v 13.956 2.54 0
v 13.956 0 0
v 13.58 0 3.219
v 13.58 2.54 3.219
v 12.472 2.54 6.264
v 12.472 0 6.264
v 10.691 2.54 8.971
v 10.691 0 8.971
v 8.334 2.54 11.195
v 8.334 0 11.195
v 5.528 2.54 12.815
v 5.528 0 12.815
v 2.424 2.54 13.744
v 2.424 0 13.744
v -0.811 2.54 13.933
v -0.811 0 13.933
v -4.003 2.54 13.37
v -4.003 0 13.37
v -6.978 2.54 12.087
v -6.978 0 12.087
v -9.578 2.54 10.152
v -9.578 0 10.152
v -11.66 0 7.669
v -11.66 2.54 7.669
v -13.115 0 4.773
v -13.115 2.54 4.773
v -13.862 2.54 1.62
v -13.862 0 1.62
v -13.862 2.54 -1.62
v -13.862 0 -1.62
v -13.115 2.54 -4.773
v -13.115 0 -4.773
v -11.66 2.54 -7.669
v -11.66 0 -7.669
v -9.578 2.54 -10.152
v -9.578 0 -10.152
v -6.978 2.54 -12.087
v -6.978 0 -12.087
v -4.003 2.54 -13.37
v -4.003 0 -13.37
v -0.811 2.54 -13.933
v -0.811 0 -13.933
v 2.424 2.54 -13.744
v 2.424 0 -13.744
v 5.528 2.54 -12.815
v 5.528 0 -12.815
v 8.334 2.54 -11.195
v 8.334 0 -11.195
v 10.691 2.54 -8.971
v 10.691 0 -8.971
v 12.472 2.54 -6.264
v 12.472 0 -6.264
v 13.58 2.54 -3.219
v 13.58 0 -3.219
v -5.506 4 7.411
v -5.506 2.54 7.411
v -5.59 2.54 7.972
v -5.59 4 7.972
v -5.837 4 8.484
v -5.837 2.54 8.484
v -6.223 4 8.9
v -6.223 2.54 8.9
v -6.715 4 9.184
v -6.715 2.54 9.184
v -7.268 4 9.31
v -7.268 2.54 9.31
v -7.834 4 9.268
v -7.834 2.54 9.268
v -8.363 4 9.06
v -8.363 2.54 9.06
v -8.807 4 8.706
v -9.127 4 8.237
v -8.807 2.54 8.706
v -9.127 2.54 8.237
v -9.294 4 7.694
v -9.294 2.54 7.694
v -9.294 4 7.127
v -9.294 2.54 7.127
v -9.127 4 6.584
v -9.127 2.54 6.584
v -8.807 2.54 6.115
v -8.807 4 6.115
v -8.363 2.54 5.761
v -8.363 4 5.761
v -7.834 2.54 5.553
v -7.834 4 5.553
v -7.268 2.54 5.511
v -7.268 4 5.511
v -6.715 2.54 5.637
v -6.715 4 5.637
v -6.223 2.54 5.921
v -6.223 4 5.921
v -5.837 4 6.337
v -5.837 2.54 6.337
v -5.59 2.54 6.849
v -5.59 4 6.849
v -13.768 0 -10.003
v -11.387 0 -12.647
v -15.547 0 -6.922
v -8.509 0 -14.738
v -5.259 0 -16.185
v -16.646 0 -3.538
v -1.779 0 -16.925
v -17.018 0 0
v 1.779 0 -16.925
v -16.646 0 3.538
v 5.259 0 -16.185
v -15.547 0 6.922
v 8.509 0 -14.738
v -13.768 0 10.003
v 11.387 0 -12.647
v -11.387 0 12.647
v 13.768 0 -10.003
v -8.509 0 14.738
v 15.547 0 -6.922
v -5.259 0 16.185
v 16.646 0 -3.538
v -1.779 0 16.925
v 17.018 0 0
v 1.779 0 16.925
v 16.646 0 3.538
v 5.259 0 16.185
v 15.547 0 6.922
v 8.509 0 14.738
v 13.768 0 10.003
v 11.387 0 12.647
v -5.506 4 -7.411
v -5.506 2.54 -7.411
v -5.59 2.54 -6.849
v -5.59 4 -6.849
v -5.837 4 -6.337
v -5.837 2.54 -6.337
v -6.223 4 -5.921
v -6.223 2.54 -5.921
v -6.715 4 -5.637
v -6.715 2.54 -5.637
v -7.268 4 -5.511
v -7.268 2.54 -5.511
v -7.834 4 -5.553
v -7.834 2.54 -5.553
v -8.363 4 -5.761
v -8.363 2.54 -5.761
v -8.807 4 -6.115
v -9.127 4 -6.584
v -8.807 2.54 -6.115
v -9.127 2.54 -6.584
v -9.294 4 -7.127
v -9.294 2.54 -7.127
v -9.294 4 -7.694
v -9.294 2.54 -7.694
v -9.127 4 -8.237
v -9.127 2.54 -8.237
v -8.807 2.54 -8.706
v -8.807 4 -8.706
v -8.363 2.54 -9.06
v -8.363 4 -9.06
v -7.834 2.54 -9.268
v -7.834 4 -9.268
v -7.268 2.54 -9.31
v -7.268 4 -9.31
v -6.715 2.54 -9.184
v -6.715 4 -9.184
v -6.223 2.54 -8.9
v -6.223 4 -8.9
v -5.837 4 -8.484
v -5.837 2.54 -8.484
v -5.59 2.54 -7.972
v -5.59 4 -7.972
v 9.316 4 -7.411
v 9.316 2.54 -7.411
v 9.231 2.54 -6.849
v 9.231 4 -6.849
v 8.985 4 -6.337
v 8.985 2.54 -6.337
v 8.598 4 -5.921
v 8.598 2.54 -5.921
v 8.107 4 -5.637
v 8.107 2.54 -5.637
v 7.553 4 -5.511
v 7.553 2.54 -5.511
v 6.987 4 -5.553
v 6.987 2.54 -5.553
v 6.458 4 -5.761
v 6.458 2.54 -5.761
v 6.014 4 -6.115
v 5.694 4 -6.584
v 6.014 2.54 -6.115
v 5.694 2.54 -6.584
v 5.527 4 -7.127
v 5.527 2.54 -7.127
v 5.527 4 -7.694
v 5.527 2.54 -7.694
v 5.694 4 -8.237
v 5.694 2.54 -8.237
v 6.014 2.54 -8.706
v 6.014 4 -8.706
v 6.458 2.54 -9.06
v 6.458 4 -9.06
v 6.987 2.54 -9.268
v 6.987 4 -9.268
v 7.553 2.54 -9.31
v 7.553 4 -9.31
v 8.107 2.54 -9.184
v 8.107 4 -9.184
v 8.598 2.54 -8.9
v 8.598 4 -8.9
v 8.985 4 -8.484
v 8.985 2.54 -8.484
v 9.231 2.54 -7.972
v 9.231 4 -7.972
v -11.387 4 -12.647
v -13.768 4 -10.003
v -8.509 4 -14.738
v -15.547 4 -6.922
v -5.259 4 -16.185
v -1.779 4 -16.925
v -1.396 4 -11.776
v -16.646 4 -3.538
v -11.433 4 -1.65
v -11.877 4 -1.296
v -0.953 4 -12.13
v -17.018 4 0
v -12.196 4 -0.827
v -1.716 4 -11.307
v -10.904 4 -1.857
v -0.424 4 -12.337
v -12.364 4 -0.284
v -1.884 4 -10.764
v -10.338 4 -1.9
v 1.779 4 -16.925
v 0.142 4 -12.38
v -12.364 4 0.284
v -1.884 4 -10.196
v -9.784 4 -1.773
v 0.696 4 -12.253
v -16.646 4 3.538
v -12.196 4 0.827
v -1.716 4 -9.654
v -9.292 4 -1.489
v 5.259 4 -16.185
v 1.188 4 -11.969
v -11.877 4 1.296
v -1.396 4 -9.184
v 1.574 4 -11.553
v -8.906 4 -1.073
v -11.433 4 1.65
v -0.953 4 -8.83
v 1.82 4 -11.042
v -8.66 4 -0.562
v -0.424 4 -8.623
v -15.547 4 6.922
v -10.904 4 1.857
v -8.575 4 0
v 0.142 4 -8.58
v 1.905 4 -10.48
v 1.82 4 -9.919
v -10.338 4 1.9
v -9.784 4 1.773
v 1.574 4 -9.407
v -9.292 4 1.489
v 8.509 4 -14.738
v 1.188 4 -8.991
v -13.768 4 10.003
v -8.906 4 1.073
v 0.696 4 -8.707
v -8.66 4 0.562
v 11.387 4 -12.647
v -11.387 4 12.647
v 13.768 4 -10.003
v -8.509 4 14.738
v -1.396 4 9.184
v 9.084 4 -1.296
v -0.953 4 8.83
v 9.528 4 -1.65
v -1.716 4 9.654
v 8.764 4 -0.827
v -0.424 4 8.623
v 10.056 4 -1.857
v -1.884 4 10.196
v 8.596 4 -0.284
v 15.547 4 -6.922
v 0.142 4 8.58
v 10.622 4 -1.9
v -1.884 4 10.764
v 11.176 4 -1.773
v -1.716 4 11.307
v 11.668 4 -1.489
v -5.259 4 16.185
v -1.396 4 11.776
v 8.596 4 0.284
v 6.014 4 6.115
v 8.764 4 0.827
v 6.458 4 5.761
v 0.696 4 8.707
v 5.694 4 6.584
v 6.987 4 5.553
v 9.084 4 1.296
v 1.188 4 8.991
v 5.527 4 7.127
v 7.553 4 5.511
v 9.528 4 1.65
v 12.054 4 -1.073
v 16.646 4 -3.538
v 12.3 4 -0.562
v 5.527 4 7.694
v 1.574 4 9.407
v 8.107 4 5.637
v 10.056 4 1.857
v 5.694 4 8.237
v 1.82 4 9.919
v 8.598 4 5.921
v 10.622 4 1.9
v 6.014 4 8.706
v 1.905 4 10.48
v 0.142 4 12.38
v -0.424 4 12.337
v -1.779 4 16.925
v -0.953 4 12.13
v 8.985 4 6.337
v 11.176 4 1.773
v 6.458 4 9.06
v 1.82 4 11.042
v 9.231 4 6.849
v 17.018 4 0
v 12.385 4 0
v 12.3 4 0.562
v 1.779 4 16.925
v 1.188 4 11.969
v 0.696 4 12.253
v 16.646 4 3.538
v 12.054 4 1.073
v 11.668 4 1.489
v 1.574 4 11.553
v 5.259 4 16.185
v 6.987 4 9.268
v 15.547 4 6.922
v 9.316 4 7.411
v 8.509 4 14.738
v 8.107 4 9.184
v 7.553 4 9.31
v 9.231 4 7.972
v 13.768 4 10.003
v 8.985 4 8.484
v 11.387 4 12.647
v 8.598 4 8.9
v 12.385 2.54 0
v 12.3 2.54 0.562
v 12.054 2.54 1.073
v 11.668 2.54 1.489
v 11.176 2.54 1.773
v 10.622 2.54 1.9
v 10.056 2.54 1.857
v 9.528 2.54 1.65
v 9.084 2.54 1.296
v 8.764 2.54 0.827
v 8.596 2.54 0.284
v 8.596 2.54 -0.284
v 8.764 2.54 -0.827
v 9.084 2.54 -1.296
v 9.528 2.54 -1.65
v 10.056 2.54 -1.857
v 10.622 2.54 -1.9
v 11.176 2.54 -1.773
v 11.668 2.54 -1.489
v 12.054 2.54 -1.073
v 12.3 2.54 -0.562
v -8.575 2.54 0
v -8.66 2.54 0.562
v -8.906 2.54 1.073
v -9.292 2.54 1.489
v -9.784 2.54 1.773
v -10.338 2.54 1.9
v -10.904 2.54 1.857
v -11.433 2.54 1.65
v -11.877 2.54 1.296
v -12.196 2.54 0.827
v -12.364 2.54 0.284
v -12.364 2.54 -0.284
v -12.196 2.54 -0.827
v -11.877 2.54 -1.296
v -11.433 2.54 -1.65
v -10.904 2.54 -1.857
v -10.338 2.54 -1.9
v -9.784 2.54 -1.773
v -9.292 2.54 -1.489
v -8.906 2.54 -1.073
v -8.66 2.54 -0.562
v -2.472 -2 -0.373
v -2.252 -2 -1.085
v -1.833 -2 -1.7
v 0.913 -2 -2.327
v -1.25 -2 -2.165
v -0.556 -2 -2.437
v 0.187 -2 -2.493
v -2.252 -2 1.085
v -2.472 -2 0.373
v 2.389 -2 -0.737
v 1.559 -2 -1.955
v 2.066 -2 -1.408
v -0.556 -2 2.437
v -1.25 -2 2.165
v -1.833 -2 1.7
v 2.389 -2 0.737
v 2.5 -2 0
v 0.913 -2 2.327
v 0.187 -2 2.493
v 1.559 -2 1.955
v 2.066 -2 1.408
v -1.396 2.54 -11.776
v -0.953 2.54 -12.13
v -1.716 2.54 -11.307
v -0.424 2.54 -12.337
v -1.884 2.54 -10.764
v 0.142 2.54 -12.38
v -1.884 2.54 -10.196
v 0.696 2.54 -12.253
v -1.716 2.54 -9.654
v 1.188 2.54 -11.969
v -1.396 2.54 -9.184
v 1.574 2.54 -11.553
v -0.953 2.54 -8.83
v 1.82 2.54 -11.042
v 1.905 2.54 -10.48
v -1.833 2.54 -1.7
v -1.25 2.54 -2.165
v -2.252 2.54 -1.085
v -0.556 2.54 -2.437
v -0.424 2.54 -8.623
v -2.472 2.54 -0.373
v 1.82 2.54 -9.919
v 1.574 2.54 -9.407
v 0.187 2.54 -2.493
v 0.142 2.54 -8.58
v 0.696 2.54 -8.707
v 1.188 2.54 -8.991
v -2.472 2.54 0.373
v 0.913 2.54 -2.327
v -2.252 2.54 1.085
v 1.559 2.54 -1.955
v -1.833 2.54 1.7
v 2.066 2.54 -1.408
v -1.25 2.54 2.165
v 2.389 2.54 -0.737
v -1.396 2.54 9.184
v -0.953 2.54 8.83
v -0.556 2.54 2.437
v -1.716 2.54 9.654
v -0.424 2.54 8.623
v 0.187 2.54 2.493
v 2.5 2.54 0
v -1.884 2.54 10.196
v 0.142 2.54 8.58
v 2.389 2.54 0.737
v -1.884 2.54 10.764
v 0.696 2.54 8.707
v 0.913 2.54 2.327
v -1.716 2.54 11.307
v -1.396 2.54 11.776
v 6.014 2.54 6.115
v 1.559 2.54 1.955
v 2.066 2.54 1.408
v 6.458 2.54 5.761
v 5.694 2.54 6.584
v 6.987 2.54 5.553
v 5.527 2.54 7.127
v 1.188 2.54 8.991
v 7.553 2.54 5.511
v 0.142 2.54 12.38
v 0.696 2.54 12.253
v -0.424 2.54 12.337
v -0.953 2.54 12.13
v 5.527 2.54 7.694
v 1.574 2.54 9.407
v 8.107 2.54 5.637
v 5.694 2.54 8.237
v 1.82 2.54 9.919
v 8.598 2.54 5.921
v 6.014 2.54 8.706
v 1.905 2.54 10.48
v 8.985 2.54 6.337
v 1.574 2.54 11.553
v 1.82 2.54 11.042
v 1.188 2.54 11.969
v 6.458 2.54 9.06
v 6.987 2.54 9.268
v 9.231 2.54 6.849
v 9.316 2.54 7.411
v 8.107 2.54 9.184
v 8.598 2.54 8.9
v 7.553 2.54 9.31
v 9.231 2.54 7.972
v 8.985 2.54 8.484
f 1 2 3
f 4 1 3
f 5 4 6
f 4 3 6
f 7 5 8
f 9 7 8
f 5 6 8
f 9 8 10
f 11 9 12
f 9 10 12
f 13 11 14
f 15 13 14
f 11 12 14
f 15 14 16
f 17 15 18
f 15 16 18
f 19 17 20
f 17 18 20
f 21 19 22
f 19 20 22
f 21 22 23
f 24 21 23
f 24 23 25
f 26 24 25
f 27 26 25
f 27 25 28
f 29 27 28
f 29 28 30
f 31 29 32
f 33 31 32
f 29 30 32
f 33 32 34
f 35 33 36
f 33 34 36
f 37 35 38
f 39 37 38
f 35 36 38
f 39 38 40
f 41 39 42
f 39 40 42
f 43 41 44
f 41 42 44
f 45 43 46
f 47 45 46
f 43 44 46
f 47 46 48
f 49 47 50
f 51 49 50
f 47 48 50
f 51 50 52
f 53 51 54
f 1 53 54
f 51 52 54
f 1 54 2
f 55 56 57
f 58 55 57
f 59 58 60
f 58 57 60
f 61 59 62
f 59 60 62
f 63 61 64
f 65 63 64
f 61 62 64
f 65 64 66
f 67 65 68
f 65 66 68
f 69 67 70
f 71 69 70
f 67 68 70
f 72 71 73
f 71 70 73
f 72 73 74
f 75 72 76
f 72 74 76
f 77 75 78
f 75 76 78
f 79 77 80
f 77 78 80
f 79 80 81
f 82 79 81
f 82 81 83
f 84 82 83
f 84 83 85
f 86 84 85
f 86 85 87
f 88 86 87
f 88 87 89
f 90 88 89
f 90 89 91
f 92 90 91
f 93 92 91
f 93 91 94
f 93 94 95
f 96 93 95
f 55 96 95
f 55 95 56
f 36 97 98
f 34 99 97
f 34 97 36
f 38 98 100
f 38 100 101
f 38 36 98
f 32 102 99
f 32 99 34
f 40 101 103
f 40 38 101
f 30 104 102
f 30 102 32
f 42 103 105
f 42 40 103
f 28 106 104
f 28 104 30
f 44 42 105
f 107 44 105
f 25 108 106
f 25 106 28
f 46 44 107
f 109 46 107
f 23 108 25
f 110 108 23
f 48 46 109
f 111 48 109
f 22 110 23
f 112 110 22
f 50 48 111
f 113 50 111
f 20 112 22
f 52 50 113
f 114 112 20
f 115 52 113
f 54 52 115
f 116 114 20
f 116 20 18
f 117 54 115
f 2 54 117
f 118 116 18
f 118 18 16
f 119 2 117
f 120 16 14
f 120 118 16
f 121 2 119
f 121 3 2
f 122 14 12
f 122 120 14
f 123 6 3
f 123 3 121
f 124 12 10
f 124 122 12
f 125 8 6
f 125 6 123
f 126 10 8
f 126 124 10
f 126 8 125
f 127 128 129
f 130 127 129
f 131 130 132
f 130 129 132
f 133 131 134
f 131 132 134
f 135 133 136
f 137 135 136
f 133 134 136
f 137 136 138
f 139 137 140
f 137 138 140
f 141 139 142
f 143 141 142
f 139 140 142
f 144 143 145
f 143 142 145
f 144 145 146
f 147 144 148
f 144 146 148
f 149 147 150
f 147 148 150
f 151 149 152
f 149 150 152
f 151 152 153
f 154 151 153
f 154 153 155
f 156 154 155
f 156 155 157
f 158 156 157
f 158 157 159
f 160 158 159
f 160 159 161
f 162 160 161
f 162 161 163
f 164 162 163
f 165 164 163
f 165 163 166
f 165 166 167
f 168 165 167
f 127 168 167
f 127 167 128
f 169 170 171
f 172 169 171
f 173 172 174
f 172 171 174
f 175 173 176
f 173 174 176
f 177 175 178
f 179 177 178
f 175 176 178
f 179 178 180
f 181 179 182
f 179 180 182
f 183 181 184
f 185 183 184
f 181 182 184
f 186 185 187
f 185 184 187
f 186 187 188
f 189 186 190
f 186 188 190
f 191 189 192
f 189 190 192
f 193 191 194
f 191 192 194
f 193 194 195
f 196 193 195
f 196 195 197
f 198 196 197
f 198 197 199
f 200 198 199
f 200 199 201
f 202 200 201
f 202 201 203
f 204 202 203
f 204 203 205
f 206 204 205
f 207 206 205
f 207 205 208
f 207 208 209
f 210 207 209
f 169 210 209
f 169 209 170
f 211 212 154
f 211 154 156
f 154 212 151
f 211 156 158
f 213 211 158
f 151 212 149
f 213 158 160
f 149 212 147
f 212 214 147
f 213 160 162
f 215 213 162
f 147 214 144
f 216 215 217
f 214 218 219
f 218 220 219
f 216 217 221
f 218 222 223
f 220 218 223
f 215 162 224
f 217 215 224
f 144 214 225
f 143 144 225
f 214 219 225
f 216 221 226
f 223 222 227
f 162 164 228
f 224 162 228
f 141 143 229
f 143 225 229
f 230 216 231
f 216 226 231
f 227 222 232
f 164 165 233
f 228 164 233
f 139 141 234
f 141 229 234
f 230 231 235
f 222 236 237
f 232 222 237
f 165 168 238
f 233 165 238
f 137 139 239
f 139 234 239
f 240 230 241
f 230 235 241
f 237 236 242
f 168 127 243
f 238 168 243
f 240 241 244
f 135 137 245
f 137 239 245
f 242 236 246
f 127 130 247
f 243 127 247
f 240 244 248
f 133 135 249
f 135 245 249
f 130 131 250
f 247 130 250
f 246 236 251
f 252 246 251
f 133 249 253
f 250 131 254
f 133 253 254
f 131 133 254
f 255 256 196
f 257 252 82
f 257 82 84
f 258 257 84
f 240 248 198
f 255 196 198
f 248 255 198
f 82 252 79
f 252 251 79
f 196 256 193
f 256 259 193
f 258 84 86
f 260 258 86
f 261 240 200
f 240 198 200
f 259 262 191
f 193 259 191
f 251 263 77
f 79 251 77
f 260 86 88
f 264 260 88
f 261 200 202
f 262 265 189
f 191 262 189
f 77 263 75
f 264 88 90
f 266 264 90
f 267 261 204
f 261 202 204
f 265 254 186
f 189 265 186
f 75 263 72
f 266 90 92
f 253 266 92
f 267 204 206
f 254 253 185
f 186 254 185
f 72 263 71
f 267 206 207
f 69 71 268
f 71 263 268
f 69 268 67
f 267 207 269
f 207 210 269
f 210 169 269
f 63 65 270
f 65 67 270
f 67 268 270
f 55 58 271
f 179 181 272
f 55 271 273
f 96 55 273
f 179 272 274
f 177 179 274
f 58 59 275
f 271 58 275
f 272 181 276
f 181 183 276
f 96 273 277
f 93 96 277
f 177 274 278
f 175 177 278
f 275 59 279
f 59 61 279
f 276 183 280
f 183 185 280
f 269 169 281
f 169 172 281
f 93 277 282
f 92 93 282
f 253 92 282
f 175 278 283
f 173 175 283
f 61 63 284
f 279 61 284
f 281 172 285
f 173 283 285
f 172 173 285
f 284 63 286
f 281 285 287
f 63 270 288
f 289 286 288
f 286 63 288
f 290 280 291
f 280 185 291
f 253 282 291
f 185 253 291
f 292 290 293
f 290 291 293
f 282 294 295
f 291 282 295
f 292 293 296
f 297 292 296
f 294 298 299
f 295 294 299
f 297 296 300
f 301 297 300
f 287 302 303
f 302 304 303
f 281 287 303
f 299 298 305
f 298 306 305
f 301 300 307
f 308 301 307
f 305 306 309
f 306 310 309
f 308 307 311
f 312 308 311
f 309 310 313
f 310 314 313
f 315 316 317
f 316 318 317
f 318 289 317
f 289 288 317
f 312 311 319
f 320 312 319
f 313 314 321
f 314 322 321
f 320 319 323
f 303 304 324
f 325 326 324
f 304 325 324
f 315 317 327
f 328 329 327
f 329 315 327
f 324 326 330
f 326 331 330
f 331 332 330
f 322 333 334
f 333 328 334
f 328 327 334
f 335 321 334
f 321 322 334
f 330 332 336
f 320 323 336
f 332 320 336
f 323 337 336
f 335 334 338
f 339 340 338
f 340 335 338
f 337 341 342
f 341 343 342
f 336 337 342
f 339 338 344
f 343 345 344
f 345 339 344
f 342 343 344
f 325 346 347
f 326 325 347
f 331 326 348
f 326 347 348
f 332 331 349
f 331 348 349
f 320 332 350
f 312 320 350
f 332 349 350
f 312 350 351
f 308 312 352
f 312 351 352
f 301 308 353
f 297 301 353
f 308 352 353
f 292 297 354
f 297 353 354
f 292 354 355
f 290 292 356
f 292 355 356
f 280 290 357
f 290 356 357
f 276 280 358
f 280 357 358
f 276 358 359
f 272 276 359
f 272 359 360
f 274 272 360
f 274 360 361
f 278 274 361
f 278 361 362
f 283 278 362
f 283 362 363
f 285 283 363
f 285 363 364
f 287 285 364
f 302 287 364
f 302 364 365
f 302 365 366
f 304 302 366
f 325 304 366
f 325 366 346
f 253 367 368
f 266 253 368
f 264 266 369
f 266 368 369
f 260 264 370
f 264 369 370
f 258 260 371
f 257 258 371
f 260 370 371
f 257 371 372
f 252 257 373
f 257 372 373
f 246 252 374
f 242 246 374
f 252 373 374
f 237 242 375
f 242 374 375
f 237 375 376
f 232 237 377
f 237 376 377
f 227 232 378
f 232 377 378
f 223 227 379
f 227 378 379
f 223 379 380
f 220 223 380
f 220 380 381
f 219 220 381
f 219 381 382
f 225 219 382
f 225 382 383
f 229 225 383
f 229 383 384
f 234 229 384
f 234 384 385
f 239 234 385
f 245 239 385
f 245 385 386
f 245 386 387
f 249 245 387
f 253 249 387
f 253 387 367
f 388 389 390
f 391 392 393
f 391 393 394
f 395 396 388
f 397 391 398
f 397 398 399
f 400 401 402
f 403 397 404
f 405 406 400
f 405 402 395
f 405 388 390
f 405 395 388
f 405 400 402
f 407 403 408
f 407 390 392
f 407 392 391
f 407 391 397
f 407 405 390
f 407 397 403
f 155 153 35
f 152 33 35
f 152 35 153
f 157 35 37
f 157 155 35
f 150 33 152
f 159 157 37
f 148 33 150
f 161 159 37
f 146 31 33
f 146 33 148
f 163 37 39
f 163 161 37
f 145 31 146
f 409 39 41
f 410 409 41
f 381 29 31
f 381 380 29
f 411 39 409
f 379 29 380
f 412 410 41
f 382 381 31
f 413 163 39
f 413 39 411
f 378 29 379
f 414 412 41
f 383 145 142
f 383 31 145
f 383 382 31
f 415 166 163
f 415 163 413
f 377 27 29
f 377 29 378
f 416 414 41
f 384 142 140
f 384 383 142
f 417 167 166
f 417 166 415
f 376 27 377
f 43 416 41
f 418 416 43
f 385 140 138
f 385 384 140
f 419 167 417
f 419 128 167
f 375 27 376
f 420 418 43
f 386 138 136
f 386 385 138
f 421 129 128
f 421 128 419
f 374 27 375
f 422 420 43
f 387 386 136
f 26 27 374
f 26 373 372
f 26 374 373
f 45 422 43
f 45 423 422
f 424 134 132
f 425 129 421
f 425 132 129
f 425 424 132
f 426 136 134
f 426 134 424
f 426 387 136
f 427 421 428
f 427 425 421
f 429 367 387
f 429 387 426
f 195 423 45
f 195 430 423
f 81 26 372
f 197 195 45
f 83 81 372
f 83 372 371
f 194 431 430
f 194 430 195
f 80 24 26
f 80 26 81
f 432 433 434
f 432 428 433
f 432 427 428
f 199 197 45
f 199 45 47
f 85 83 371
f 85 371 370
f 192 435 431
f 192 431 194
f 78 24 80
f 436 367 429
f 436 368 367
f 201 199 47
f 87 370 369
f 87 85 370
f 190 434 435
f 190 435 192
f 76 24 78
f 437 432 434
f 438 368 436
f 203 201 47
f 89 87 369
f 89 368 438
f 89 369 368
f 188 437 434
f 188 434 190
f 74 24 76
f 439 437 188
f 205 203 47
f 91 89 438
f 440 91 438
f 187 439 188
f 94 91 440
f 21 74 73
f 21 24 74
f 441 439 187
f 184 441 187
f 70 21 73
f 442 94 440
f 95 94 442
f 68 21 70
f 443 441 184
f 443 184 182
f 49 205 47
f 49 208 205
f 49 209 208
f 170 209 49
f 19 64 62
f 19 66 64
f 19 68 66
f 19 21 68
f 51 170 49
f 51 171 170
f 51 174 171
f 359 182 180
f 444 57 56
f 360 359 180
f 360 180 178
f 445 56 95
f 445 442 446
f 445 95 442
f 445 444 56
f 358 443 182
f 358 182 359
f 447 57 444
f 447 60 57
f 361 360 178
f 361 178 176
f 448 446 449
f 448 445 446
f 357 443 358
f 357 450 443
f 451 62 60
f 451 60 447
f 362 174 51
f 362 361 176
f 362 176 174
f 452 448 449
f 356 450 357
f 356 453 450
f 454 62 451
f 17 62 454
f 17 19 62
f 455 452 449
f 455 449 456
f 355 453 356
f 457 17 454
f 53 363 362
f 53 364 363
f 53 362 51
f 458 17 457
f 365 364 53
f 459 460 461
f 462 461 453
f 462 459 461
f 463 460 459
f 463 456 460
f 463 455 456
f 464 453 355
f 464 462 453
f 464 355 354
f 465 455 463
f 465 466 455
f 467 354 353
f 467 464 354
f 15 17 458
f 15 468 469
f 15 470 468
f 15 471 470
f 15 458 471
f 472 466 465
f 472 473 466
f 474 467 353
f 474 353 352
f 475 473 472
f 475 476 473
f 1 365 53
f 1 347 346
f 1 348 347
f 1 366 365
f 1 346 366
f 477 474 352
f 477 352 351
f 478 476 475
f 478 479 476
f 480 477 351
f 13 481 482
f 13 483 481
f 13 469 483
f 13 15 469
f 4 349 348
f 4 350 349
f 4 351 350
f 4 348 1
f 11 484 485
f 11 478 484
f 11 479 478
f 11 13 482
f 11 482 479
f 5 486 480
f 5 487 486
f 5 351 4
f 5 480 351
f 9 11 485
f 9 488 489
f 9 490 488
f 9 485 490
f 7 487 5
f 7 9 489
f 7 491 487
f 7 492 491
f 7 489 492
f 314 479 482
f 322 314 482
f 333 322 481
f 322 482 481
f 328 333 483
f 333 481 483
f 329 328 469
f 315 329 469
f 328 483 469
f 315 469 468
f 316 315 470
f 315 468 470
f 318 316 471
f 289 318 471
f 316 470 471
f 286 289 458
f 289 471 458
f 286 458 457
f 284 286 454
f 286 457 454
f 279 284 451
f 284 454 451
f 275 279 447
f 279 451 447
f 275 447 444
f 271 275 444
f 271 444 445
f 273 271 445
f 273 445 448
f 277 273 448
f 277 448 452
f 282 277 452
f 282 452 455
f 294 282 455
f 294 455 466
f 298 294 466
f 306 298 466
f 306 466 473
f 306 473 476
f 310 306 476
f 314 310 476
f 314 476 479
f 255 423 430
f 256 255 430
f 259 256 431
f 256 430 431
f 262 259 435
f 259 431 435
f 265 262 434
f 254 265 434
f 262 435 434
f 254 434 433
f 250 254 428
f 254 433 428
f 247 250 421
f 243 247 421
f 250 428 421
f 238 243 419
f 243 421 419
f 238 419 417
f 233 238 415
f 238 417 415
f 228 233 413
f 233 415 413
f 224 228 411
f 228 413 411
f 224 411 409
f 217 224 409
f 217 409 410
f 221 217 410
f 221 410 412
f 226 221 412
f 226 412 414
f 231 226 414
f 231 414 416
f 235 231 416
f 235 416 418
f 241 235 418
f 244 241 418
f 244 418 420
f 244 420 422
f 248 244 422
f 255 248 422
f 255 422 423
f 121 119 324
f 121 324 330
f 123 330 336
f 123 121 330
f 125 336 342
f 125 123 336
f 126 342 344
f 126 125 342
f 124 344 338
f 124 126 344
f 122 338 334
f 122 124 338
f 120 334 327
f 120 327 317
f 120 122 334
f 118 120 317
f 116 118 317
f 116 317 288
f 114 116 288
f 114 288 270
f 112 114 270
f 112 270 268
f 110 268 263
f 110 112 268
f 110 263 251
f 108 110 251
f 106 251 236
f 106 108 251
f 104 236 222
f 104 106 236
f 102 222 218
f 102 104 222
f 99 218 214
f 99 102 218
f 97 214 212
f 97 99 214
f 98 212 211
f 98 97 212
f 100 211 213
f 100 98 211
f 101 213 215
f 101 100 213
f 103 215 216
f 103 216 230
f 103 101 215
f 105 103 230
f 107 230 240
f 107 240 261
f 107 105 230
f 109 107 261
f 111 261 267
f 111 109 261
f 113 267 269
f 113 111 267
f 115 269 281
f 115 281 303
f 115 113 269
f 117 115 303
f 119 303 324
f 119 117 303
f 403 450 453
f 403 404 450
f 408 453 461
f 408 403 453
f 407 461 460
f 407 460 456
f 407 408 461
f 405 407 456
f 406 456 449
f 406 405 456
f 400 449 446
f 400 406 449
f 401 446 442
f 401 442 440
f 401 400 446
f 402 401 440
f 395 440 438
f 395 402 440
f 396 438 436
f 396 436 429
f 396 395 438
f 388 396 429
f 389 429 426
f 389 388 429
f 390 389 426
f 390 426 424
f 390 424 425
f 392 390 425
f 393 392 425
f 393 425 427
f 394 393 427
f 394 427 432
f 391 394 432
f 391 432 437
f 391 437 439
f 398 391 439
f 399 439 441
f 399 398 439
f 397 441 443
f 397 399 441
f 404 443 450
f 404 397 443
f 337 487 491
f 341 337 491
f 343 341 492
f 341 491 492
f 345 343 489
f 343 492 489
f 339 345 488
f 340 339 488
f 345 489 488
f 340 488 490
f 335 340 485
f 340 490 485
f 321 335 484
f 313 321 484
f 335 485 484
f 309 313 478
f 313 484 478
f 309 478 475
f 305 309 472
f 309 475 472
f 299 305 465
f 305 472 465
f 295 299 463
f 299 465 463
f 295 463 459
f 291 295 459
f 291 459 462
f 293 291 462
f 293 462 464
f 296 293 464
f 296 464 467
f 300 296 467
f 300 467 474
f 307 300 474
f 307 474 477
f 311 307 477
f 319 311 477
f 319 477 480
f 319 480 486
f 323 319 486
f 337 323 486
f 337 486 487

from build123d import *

# Parameters (mm, degrees)
F0_R      = 17.018
F1_DEPTH  = 4
F4_R      = 2.5
F5_DEPTH  = 2
F7_R      = 1.905
F8_DEPTH  = 25.4
F9_R      = 13.9564544628
F9_R_2    = 1.905
F9_R_3    = 2.5
F10_DEPTH = 2.54


# Not quite as in the source:
# - the program builds the solid bodies; features that only make, move or delete a surface that nothing else refers to are left out


with BuildPart() as f1:
    # F0 (on Front) → F1 (new body)
    with BuildSketch(Plane.XZ):
        Circle(F0_R)
    extrude(amount=-F1_DEPTH)

    # F4 (on Front) → F5 (join)
    with BuildSketch(Plane.XZ):
        Circle(F4_R)
    extrude(amount=F5_DEPTH)

    # F7 (on face) → F8 (cut)
    with BuildSketch(Plane.XZ):
        with Locations((-7.4105341768, 7.4105341768)):
            Circle(F7_R)
        with Locations((0, 10.4800779372)):
            Circle(F7_R)
        with Locations((7.4105341768, 7.4105341768)):
            Circle(F7_R)
        with Locations((10.4800779372, 0)):
            Circle(F7_R)
        with Locations((7.4105341768, -7.4105341768)):
            Circle(F7_R)
        with Locations((0, -10.4800779372)):
            Circle(F7_R)
        with Locations((-7.4105341768, -7.4105341768)):
            Circle(F7_R)
        with Locations((-10.4800779372, 0)):
            Circle(F7_R)
    extrude(amount=-F8_DEPTH, mode=Mode.SUBTRACT)

    # F9 (on face) → F10 (cut)
    with BuildSketch(Plane.XZ):
        Circle(F9_R)
        with Locations((-7.4105341768, -7.4105341768)):
            Circle(F9_R_2, mode=Mode.SUBTRACT)
        with Locations((0, -10.4800779372)):
            Circle(F9_R_2, mode=Mode.SUBTRACT)
        with Locations((7.4105341768, -7.4105341768)):
            Circle(F9_R_2, mode=Mode.SUBTRACT)
        with Locations((-10.4800779372, 0)):
            Circle(F9_R_2, mode=Mode.SUBTRACT)
        with Locations((-7.4105341768, 7.4105341768)):
            Circle(F9_R_2, mode=Mode.SUBTRACT)
        Circle(F9_R_3, mode=Mode.SUBTRACT)
        with Locations((7.4105341768, 7.4105341768)):
            Circle(F9_R_2, mode=Mode.SUBTRACT)
        with Locations((10.4800779372, 0)):
            Circle(F9_R_2, mode=Mode.SUBTRACT)
        with Locations((0, 10.4800779372)):
            Circle(F9_R_2, mode=Mode.SUBTRACT)
    extrude(amount=-F10_DEPTH, mode=Mode.SUBTRACT)


solid = f1.part
